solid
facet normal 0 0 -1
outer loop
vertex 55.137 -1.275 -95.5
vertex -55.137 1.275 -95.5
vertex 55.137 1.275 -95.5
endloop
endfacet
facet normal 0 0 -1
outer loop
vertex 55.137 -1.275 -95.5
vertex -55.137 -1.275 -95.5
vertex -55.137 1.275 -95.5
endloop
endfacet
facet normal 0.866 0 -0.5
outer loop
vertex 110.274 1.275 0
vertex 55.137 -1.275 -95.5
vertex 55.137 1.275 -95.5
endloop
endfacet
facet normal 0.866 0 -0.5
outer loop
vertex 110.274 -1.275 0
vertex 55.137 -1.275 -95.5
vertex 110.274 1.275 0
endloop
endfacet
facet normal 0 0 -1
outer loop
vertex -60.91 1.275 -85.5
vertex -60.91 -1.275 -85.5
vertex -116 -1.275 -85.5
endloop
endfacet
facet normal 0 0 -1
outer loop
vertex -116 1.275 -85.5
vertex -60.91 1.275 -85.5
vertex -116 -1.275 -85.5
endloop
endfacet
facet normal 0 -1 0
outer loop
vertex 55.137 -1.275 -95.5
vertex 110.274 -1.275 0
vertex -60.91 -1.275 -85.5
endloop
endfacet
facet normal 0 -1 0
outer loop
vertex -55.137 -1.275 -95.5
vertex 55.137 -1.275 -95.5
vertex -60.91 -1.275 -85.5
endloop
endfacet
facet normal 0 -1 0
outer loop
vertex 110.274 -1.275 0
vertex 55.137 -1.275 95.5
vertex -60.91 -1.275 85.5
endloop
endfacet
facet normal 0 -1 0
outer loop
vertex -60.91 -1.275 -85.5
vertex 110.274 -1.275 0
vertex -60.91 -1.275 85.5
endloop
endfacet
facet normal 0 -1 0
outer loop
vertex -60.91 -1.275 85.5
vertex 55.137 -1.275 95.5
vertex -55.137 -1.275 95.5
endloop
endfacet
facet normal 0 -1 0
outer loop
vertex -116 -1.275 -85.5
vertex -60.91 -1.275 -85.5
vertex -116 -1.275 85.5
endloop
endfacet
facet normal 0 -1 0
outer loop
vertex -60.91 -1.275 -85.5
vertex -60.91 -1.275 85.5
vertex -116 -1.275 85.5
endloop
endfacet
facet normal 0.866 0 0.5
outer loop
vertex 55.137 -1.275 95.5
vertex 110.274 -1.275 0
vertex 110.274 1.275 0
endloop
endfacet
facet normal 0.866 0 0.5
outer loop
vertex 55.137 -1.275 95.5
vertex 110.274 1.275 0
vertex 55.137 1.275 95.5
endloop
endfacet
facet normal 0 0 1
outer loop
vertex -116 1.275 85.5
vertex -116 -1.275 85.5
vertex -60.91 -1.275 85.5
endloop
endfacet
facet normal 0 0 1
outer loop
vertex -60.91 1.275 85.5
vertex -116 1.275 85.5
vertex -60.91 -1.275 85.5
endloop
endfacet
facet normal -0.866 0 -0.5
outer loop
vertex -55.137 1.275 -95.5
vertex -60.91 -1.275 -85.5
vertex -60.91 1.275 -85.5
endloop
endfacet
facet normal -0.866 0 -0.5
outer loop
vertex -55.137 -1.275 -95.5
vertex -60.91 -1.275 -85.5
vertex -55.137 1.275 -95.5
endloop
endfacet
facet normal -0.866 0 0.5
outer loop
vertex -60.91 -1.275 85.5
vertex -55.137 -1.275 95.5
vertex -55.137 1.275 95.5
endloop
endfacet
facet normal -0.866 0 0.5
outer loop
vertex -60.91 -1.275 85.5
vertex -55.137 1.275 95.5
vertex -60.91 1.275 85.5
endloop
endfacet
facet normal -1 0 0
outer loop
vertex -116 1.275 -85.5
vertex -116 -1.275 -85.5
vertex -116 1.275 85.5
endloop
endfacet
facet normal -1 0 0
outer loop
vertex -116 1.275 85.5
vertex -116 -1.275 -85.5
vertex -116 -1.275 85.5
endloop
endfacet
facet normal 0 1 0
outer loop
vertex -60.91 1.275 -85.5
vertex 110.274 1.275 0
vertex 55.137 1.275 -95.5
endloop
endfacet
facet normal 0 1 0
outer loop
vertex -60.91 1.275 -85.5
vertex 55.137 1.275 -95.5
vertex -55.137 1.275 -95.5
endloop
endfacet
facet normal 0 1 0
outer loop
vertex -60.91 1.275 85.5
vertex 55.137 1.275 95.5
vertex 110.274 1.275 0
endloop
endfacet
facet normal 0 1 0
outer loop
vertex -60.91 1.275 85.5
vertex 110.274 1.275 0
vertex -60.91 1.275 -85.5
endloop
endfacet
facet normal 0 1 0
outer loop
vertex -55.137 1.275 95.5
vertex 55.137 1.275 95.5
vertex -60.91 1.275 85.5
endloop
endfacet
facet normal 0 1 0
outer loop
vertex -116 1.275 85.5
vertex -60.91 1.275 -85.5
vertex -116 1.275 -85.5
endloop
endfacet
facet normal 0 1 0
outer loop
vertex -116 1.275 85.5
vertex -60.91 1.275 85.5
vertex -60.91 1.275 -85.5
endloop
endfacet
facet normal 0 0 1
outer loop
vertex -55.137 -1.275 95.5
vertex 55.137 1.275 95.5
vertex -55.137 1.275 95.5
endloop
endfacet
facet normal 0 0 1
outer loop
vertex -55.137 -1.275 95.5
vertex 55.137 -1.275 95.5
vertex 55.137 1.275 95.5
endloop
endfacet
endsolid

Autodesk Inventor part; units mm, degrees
ref_plane "YZ Plane" through (0, 0, 0) normal (1, 0, 0) x (0, 1, 0)
ref_plane "XZ Plane" through (0, 0, 0) normal (0, 1, 0) x (-1, 0, 0)
ref_plane "XY Plane" through (0, 0, 0) normal (0, 0, 1) x (1, 0, 0)
sketch "Sketch1" plane through (0, 0, 0) normal (0, 1, 0) x (-1, 0, 0)
  line L0 (-110.2739, 0) -> (-55.137, 95.5)
  line L1 (-55.137, 95.5) -> (55.137, 95.5)
  line L2 (55.137, 95.5) -> (110.2739, 0)
  line L3 (110.2739, 0) -> (55.137, -95.5)
  line L4 (55.137, -95.5) -> (-55.137, -95.5)
  line L5 (-55.137, -95.5) -> (-110.2739, 0)
  line L6 (60.9105, -85.5) -> (116, -85.5)
  line L7 (116, -85.5) -> (116, 85.5)
  line L8 (116, 85.5) -> (60.9105, 85.5)
  point P0 (0, 0)
  point P1 (0, 0)
  point P2 (116, 0)
  dimension "d5" = 191
  dimension "d6" = 171
  dimension "d7" = 116
extrude "Extrusion1" add sketch "Sketch1" along normal mid plane 2.55
properties part number "PlayerTacticalMats_All" material "Paper"
